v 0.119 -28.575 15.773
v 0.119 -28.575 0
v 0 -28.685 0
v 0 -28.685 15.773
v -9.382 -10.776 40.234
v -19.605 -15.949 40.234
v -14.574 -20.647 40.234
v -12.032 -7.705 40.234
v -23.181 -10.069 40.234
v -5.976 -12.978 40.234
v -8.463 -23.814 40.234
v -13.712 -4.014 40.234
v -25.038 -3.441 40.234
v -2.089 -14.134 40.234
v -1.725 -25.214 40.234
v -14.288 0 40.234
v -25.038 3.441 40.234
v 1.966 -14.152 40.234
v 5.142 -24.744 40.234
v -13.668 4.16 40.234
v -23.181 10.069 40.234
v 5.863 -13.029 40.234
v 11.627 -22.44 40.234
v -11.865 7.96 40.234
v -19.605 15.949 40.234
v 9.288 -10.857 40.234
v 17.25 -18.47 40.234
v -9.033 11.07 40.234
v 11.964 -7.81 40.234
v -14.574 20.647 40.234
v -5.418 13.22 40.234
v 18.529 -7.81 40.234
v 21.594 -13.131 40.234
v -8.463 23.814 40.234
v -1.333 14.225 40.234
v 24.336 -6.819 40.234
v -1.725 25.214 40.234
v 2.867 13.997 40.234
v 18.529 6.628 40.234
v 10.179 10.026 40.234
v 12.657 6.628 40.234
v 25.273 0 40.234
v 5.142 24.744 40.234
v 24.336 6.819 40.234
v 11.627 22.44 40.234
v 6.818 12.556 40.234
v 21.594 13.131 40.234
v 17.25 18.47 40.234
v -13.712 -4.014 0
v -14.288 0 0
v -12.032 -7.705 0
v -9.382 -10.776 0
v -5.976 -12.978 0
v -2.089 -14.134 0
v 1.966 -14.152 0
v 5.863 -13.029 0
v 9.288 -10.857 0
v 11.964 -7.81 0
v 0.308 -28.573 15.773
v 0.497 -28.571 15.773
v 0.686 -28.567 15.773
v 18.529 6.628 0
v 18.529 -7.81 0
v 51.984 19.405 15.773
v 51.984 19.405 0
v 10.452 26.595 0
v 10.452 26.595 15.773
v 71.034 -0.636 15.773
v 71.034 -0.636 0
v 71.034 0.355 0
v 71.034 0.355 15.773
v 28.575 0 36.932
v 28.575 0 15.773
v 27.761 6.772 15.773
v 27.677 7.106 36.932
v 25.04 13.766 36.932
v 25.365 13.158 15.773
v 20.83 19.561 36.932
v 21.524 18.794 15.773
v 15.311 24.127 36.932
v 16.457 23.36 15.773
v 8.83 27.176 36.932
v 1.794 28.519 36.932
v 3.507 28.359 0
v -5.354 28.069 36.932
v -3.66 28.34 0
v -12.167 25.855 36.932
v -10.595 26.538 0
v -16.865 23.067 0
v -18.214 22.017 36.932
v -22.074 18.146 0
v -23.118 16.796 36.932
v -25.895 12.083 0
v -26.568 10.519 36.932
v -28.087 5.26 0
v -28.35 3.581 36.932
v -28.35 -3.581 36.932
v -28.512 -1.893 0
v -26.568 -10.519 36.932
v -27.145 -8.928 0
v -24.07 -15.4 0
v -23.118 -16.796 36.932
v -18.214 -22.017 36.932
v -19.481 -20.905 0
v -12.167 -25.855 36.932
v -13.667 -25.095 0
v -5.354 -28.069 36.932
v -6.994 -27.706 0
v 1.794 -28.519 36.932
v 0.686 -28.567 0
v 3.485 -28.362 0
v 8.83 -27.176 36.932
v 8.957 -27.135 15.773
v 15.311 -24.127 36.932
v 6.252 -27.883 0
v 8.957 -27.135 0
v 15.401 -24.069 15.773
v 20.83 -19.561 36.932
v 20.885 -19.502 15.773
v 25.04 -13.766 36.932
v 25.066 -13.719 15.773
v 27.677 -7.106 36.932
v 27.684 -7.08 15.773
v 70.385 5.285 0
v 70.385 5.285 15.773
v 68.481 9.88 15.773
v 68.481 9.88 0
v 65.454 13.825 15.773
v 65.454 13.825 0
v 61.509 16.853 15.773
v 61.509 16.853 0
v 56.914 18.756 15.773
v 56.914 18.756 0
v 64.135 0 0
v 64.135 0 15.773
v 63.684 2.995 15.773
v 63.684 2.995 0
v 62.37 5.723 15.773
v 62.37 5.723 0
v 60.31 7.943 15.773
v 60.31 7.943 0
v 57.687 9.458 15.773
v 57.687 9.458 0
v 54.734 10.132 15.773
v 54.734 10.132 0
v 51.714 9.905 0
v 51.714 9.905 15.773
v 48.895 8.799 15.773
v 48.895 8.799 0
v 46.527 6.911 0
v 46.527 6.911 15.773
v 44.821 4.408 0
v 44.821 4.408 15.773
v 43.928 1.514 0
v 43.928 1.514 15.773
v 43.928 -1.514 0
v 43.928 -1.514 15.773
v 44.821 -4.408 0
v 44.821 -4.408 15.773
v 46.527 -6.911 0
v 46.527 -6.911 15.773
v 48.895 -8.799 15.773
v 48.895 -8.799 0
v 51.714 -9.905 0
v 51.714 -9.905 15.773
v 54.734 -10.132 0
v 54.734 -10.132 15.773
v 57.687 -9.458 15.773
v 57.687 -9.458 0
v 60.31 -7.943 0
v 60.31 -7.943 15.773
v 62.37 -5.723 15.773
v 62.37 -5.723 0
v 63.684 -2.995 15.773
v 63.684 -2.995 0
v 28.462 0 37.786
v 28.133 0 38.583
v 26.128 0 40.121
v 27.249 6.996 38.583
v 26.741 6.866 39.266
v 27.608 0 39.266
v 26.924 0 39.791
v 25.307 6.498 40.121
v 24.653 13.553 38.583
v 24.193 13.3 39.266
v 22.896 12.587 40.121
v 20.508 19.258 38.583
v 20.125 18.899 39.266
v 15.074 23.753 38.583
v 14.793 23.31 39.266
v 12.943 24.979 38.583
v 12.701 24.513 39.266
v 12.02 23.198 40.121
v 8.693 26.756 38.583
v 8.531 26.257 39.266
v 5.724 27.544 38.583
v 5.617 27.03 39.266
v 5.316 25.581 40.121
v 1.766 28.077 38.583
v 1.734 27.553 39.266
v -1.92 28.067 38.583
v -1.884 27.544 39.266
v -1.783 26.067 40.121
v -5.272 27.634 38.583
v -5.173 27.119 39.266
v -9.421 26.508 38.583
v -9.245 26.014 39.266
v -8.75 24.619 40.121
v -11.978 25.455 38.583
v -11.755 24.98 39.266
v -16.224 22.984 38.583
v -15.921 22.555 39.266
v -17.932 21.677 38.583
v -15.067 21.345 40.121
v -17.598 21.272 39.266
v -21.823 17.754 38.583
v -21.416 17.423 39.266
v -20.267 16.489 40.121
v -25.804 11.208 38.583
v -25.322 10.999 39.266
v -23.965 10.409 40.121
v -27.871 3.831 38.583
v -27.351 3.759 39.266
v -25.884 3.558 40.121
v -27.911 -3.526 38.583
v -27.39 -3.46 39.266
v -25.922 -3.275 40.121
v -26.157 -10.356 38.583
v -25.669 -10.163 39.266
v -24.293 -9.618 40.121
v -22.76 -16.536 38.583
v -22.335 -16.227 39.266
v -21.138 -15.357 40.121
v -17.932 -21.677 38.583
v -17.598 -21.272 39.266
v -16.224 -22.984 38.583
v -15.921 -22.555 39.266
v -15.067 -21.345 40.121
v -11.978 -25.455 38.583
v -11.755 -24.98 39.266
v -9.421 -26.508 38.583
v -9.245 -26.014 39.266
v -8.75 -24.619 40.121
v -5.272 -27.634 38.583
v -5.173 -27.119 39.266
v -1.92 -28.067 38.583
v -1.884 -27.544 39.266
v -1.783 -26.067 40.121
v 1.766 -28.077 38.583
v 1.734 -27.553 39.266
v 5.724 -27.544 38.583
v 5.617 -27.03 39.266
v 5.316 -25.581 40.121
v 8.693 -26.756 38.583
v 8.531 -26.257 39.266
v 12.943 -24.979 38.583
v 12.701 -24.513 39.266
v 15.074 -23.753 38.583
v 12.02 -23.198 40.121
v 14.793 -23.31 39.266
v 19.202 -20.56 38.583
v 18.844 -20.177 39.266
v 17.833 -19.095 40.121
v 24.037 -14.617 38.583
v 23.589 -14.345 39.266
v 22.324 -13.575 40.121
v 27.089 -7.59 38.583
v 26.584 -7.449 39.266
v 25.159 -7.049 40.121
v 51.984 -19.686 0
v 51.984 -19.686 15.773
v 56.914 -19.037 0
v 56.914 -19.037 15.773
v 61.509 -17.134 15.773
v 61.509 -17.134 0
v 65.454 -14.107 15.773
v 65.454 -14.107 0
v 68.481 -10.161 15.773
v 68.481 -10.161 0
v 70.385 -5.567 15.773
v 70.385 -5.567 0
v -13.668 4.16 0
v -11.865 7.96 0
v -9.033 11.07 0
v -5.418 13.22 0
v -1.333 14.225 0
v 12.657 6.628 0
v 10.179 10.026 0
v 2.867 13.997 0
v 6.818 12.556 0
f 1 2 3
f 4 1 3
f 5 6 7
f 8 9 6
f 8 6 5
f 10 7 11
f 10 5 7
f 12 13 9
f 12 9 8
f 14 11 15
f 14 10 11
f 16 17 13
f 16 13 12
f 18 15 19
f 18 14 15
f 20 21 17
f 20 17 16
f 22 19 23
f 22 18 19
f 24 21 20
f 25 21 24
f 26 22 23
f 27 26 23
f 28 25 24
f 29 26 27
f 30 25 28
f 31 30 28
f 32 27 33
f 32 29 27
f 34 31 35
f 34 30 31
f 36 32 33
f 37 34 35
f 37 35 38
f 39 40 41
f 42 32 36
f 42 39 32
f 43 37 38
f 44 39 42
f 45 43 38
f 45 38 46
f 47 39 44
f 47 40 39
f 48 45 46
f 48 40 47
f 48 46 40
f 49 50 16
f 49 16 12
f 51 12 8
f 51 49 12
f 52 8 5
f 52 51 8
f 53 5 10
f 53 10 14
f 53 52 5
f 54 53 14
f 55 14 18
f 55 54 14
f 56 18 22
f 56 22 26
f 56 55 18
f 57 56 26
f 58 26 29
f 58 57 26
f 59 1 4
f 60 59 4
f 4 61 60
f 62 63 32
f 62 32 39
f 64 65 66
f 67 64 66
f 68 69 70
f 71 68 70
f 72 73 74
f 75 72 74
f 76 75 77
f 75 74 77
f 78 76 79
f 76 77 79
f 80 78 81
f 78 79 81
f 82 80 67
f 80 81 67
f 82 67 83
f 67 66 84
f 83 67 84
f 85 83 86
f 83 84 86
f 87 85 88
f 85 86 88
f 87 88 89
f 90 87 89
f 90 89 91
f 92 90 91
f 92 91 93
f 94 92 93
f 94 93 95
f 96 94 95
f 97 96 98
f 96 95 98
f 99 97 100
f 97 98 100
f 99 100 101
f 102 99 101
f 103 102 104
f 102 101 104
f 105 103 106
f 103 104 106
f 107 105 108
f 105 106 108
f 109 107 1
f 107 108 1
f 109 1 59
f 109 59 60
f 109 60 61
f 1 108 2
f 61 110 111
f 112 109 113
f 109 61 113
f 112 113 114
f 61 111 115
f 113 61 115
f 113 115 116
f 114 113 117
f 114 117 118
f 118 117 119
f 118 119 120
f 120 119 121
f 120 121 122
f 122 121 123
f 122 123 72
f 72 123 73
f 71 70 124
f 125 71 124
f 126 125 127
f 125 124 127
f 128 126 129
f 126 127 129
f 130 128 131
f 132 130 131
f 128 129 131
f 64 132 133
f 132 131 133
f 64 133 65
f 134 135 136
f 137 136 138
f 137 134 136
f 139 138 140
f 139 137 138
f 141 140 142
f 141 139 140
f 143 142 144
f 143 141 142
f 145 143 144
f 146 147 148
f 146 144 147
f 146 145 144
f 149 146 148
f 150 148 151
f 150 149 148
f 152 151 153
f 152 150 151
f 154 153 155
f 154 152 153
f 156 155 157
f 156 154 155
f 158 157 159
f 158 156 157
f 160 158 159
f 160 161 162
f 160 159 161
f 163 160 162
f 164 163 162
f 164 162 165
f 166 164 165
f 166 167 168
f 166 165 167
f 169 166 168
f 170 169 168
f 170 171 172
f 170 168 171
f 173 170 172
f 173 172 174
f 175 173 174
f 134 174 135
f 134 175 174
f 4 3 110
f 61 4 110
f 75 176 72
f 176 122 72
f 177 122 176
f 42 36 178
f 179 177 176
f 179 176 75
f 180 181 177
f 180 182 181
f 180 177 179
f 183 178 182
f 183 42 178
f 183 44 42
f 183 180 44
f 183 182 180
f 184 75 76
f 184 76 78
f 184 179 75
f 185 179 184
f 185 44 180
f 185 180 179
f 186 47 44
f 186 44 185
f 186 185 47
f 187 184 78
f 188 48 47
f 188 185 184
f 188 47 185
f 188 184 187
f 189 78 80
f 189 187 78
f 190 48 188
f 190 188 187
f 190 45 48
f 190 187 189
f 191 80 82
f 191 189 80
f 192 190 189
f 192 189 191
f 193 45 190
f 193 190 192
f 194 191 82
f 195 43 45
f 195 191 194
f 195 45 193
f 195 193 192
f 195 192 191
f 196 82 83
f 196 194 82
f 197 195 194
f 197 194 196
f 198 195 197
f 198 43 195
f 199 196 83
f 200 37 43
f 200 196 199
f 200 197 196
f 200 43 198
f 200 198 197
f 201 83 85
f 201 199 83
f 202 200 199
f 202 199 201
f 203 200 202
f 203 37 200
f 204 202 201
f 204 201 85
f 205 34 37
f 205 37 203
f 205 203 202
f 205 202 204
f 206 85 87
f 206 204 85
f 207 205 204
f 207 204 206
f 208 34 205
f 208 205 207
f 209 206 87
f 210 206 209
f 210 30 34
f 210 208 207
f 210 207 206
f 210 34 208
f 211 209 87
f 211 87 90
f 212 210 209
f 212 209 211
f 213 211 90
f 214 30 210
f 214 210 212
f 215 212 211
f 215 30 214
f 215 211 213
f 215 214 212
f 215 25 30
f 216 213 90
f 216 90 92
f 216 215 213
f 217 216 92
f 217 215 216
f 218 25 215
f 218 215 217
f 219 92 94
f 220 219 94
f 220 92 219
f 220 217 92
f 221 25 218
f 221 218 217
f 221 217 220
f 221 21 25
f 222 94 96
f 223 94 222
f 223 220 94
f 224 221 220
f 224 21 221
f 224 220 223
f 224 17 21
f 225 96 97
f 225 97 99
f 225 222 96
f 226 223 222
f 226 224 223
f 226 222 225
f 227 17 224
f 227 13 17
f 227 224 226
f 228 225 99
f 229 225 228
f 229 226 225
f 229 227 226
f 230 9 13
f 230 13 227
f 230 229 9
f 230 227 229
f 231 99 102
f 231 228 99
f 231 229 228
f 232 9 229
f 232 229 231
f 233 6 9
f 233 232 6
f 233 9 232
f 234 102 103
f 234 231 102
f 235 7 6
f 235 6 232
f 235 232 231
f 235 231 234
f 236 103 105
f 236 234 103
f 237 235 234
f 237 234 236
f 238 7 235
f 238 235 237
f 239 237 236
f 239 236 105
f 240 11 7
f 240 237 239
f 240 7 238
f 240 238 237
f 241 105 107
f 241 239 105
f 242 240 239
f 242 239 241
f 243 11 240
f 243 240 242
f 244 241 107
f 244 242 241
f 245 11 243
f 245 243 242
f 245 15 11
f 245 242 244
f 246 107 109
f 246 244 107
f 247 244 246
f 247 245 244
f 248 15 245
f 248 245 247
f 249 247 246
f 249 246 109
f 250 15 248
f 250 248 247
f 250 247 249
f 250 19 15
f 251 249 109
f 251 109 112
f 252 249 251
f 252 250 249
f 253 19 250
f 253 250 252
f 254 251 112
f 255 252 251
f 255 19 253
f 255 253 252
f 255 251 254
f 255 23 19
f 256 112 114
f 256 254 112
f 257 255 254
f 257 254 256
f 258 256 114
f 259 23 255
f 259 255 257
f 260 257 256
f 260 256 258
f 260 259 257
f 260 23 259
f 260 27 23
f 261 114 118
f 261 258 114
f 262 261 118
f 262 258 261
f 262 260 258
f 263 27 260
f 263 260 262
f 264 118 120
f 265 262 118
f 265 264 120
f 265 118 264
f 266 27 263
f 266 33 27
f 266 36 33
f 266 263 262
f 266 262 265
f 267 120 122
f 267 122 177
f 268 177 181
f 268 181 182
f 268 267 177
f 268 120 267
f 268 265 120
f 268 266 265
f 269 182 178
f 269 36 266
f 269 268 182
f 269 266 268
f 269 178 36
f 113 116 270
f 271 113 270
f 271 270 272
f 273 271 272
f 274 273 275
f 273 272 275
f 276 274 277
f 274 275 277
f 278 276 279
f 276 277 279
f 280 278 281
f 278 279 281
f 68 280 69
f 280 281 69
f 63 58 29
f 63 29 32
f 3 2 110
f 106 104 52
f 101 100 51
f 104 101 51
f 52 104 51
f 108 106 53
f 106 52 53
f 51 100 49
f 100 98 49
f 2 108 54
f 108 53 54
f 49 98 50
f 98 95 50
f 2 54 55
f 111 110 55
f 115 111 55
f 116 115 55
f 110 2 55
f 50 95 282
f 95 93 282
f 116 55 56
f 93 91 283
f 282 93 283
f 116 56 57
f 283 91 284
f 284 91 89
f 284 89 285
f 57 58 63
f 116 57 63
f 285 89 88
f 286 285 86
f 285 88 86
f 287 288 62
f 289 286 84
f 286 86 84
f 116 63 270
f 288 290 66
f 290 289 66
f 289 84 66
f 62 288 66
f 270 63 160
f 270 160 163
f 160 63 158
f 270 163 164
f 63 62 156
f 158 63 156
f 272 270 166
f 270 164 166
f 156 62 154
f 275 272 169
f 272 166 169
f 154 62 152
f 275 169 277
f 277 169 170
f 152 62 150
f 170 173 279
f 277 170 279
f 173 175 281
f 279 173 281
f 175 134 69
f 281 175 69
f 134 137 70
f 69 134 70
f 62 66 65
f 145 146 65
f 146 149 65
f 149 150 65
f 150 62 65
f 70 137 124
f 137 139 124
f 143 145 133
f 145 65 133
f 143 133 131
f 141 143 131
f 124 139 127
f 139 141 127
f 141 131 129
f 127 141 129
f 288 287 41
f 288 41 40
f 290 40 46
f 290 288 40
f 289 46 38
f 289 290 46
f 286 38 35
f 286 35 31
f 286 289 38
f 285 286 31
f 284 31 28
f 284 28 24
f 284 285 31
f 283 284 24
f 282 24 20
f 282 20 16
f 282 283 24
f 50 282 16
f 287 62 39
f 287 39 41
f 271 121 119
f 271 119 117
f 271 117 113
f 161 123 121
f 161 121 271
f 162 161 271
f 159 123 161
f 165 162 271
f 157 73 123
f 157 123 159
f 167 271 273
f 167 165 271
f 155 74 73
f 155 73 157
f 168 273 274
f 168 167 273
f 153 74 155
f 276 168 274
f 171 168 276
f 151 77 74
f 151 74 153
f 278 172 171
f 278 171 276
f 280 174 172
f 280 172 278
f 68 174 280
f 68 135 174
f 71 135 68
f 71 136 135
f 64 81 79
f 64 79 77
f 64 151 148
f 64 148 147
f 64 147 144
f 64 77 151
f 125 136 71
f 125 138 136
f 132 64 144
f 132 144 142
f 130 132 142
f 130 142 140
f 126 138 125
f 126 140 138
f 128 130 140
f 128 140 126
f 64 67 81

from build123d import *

# Parameters (mm, degrees)
F1_R     = 28.575
F2_DEPTH = 40.2336
F3_R     = 3.302
F4_DEPTH = 40.2336
F7_DEPTH = 15.7734
F5_R     = 10.16
F8_DEPTH = 25.4


with BuildPart() as f2:
    # F1 (on Top) → F2 (new body)
    with BuildSketch(Plane.XY):
        Circle(F1_R)
    extrude(amount=F2_DEPTH)

    # F3
    f3_edges = [f2.edges().sort_by_distance(p)[0] for p in [
        (-28.575, 0, 40.2336),
    ]]
    fillet(f3_edges, radius=F3_R)

    # F0 (on Top) → F4 (cut)
    with BuildSketch(Plane.XY):
        with BuildLine():
            Line((8.8773, 0), (14.2875, 0))
            ThreePointArc((14.2875, 0), (13.8739387677, 3.4126938508), (12.6571966832, 6.6278222948))
            Line((12.6571966832, 6.6278222948), (8.8773, 6.6278222948))
            Line((8.8773, 6.6278222948), (8.8773, 0))
        make_face()
        with BuildLine():
            Line((18.5293, 0), (14.2875, 0))
            ThreePointArc((14.2875, 0), (13.6943674733, -4.0739361504), (11.9642166044, -7.8096208163))
            Line((11.9642166044, -7.8096208163), (18.5293, -7.8096208163))
            Line((18.5293, -7.8096208163), (18.5293, 0))
        make_face()
        with BuildLine():
            ThreePointArc((12.6571966832, 6.6278222948), (13.8739387677, 3.4126938508), (14.2875, 0))
            Line((14.2875, 0), (18.5293, 0))
            Line((18.5293, 0), (18.5293, 6.6278222948))
            Line((18.5293, 6.6278222948), (12.6571966832, 6.6278222948))
        make_face()
        with BuildLine():
            ThreePointArc((11.9642166044, -7.8096208163), (13.6943674733, -4.0739361504), (14.2875, 0))
            Line((14.2875, 0), (8.8773, 0))
            Line((8.8773, 0), (8.8773, -7.8096208163))
            Line((8.8773, -7.8096208163), (11.9642166044, -7.8096208163))
        make_face()
        with BuildLine():
            Line((8.8773, 6.6278222948), (12.6571966832, 6.6278222948))
            ThreePointArc((12.6571966832, 6.6278222948), (-3.4126938508, 13.8739387677), (-14.2875, 0))
            Line((-14.2875, 0), (8.8773, 0))
            Line((8.8773, 0), (8.8773, 6.6278222948))
        make_face()
        with BuildLine():
            ThreePointArc((-14.2875, 0), (-4.0739361504, -13.6943674733), (11.9642166044, -7.8096208163))
            Line((11.9642166044, -7.8096208163), (8.8773, -7.8096208163))
            Line((8.8773, -7.8096208163), (8.8773, 0))
            Line((8.8773, 0), (-14.2875, 0))
        make_face()
    extrude(amount=F4_DEPTH, mode=Mode.SUBTRACT)

    # F6 (on Top) → F7 (join)
    with BuildSketch(Plane.XY):
        Polygon((36.9937829673, -19.6861159056), (36.9937829673, 19.4048862904), (51.9836863995, 19.4048862904), (0, 28.4042526037), (21.5210951865, 10.1242884994), (21.5210951865, -8.7181376293), (0, -28.6854840815), (51.9836863995, -19.6861159056), align=None)
        with BuildLine():
            Line((51.9836863995, 19.4048862904), (36.9937829673, 19.4048862904))
            Line((36.9937829673, 19.4048862904), (36.9937829673, -19.6861159056))
            Line((36.9937829673, -19.6861159056), (51.9836863995, -19.6861159056))
            ThreePointArc((51.9836863995, -19.6861159056), (65.4540705811, -14.1065000872), (71.0336863995, -0.6361159056))
            Line((71.0336863995, -0.6361159056), (71.0336863995, 0.3548862904))
            ThreePointArc((71.0336863995, 0.3548862904), (65.4540705811, 13.825270472), (51.9836863995, 19.4048862904))
        make_face()
    extrude(amount=F7_DEPTH)

    # F5 (on Top) → F8 (cut)
    with BuildSketch(Plane.XY):
        with Locations((53.975, 0)):
            Circle(F5_R)
    extrude(amount=F8_DEPTH, mode=Mode.SUBTRACT)


solid = f2.part
